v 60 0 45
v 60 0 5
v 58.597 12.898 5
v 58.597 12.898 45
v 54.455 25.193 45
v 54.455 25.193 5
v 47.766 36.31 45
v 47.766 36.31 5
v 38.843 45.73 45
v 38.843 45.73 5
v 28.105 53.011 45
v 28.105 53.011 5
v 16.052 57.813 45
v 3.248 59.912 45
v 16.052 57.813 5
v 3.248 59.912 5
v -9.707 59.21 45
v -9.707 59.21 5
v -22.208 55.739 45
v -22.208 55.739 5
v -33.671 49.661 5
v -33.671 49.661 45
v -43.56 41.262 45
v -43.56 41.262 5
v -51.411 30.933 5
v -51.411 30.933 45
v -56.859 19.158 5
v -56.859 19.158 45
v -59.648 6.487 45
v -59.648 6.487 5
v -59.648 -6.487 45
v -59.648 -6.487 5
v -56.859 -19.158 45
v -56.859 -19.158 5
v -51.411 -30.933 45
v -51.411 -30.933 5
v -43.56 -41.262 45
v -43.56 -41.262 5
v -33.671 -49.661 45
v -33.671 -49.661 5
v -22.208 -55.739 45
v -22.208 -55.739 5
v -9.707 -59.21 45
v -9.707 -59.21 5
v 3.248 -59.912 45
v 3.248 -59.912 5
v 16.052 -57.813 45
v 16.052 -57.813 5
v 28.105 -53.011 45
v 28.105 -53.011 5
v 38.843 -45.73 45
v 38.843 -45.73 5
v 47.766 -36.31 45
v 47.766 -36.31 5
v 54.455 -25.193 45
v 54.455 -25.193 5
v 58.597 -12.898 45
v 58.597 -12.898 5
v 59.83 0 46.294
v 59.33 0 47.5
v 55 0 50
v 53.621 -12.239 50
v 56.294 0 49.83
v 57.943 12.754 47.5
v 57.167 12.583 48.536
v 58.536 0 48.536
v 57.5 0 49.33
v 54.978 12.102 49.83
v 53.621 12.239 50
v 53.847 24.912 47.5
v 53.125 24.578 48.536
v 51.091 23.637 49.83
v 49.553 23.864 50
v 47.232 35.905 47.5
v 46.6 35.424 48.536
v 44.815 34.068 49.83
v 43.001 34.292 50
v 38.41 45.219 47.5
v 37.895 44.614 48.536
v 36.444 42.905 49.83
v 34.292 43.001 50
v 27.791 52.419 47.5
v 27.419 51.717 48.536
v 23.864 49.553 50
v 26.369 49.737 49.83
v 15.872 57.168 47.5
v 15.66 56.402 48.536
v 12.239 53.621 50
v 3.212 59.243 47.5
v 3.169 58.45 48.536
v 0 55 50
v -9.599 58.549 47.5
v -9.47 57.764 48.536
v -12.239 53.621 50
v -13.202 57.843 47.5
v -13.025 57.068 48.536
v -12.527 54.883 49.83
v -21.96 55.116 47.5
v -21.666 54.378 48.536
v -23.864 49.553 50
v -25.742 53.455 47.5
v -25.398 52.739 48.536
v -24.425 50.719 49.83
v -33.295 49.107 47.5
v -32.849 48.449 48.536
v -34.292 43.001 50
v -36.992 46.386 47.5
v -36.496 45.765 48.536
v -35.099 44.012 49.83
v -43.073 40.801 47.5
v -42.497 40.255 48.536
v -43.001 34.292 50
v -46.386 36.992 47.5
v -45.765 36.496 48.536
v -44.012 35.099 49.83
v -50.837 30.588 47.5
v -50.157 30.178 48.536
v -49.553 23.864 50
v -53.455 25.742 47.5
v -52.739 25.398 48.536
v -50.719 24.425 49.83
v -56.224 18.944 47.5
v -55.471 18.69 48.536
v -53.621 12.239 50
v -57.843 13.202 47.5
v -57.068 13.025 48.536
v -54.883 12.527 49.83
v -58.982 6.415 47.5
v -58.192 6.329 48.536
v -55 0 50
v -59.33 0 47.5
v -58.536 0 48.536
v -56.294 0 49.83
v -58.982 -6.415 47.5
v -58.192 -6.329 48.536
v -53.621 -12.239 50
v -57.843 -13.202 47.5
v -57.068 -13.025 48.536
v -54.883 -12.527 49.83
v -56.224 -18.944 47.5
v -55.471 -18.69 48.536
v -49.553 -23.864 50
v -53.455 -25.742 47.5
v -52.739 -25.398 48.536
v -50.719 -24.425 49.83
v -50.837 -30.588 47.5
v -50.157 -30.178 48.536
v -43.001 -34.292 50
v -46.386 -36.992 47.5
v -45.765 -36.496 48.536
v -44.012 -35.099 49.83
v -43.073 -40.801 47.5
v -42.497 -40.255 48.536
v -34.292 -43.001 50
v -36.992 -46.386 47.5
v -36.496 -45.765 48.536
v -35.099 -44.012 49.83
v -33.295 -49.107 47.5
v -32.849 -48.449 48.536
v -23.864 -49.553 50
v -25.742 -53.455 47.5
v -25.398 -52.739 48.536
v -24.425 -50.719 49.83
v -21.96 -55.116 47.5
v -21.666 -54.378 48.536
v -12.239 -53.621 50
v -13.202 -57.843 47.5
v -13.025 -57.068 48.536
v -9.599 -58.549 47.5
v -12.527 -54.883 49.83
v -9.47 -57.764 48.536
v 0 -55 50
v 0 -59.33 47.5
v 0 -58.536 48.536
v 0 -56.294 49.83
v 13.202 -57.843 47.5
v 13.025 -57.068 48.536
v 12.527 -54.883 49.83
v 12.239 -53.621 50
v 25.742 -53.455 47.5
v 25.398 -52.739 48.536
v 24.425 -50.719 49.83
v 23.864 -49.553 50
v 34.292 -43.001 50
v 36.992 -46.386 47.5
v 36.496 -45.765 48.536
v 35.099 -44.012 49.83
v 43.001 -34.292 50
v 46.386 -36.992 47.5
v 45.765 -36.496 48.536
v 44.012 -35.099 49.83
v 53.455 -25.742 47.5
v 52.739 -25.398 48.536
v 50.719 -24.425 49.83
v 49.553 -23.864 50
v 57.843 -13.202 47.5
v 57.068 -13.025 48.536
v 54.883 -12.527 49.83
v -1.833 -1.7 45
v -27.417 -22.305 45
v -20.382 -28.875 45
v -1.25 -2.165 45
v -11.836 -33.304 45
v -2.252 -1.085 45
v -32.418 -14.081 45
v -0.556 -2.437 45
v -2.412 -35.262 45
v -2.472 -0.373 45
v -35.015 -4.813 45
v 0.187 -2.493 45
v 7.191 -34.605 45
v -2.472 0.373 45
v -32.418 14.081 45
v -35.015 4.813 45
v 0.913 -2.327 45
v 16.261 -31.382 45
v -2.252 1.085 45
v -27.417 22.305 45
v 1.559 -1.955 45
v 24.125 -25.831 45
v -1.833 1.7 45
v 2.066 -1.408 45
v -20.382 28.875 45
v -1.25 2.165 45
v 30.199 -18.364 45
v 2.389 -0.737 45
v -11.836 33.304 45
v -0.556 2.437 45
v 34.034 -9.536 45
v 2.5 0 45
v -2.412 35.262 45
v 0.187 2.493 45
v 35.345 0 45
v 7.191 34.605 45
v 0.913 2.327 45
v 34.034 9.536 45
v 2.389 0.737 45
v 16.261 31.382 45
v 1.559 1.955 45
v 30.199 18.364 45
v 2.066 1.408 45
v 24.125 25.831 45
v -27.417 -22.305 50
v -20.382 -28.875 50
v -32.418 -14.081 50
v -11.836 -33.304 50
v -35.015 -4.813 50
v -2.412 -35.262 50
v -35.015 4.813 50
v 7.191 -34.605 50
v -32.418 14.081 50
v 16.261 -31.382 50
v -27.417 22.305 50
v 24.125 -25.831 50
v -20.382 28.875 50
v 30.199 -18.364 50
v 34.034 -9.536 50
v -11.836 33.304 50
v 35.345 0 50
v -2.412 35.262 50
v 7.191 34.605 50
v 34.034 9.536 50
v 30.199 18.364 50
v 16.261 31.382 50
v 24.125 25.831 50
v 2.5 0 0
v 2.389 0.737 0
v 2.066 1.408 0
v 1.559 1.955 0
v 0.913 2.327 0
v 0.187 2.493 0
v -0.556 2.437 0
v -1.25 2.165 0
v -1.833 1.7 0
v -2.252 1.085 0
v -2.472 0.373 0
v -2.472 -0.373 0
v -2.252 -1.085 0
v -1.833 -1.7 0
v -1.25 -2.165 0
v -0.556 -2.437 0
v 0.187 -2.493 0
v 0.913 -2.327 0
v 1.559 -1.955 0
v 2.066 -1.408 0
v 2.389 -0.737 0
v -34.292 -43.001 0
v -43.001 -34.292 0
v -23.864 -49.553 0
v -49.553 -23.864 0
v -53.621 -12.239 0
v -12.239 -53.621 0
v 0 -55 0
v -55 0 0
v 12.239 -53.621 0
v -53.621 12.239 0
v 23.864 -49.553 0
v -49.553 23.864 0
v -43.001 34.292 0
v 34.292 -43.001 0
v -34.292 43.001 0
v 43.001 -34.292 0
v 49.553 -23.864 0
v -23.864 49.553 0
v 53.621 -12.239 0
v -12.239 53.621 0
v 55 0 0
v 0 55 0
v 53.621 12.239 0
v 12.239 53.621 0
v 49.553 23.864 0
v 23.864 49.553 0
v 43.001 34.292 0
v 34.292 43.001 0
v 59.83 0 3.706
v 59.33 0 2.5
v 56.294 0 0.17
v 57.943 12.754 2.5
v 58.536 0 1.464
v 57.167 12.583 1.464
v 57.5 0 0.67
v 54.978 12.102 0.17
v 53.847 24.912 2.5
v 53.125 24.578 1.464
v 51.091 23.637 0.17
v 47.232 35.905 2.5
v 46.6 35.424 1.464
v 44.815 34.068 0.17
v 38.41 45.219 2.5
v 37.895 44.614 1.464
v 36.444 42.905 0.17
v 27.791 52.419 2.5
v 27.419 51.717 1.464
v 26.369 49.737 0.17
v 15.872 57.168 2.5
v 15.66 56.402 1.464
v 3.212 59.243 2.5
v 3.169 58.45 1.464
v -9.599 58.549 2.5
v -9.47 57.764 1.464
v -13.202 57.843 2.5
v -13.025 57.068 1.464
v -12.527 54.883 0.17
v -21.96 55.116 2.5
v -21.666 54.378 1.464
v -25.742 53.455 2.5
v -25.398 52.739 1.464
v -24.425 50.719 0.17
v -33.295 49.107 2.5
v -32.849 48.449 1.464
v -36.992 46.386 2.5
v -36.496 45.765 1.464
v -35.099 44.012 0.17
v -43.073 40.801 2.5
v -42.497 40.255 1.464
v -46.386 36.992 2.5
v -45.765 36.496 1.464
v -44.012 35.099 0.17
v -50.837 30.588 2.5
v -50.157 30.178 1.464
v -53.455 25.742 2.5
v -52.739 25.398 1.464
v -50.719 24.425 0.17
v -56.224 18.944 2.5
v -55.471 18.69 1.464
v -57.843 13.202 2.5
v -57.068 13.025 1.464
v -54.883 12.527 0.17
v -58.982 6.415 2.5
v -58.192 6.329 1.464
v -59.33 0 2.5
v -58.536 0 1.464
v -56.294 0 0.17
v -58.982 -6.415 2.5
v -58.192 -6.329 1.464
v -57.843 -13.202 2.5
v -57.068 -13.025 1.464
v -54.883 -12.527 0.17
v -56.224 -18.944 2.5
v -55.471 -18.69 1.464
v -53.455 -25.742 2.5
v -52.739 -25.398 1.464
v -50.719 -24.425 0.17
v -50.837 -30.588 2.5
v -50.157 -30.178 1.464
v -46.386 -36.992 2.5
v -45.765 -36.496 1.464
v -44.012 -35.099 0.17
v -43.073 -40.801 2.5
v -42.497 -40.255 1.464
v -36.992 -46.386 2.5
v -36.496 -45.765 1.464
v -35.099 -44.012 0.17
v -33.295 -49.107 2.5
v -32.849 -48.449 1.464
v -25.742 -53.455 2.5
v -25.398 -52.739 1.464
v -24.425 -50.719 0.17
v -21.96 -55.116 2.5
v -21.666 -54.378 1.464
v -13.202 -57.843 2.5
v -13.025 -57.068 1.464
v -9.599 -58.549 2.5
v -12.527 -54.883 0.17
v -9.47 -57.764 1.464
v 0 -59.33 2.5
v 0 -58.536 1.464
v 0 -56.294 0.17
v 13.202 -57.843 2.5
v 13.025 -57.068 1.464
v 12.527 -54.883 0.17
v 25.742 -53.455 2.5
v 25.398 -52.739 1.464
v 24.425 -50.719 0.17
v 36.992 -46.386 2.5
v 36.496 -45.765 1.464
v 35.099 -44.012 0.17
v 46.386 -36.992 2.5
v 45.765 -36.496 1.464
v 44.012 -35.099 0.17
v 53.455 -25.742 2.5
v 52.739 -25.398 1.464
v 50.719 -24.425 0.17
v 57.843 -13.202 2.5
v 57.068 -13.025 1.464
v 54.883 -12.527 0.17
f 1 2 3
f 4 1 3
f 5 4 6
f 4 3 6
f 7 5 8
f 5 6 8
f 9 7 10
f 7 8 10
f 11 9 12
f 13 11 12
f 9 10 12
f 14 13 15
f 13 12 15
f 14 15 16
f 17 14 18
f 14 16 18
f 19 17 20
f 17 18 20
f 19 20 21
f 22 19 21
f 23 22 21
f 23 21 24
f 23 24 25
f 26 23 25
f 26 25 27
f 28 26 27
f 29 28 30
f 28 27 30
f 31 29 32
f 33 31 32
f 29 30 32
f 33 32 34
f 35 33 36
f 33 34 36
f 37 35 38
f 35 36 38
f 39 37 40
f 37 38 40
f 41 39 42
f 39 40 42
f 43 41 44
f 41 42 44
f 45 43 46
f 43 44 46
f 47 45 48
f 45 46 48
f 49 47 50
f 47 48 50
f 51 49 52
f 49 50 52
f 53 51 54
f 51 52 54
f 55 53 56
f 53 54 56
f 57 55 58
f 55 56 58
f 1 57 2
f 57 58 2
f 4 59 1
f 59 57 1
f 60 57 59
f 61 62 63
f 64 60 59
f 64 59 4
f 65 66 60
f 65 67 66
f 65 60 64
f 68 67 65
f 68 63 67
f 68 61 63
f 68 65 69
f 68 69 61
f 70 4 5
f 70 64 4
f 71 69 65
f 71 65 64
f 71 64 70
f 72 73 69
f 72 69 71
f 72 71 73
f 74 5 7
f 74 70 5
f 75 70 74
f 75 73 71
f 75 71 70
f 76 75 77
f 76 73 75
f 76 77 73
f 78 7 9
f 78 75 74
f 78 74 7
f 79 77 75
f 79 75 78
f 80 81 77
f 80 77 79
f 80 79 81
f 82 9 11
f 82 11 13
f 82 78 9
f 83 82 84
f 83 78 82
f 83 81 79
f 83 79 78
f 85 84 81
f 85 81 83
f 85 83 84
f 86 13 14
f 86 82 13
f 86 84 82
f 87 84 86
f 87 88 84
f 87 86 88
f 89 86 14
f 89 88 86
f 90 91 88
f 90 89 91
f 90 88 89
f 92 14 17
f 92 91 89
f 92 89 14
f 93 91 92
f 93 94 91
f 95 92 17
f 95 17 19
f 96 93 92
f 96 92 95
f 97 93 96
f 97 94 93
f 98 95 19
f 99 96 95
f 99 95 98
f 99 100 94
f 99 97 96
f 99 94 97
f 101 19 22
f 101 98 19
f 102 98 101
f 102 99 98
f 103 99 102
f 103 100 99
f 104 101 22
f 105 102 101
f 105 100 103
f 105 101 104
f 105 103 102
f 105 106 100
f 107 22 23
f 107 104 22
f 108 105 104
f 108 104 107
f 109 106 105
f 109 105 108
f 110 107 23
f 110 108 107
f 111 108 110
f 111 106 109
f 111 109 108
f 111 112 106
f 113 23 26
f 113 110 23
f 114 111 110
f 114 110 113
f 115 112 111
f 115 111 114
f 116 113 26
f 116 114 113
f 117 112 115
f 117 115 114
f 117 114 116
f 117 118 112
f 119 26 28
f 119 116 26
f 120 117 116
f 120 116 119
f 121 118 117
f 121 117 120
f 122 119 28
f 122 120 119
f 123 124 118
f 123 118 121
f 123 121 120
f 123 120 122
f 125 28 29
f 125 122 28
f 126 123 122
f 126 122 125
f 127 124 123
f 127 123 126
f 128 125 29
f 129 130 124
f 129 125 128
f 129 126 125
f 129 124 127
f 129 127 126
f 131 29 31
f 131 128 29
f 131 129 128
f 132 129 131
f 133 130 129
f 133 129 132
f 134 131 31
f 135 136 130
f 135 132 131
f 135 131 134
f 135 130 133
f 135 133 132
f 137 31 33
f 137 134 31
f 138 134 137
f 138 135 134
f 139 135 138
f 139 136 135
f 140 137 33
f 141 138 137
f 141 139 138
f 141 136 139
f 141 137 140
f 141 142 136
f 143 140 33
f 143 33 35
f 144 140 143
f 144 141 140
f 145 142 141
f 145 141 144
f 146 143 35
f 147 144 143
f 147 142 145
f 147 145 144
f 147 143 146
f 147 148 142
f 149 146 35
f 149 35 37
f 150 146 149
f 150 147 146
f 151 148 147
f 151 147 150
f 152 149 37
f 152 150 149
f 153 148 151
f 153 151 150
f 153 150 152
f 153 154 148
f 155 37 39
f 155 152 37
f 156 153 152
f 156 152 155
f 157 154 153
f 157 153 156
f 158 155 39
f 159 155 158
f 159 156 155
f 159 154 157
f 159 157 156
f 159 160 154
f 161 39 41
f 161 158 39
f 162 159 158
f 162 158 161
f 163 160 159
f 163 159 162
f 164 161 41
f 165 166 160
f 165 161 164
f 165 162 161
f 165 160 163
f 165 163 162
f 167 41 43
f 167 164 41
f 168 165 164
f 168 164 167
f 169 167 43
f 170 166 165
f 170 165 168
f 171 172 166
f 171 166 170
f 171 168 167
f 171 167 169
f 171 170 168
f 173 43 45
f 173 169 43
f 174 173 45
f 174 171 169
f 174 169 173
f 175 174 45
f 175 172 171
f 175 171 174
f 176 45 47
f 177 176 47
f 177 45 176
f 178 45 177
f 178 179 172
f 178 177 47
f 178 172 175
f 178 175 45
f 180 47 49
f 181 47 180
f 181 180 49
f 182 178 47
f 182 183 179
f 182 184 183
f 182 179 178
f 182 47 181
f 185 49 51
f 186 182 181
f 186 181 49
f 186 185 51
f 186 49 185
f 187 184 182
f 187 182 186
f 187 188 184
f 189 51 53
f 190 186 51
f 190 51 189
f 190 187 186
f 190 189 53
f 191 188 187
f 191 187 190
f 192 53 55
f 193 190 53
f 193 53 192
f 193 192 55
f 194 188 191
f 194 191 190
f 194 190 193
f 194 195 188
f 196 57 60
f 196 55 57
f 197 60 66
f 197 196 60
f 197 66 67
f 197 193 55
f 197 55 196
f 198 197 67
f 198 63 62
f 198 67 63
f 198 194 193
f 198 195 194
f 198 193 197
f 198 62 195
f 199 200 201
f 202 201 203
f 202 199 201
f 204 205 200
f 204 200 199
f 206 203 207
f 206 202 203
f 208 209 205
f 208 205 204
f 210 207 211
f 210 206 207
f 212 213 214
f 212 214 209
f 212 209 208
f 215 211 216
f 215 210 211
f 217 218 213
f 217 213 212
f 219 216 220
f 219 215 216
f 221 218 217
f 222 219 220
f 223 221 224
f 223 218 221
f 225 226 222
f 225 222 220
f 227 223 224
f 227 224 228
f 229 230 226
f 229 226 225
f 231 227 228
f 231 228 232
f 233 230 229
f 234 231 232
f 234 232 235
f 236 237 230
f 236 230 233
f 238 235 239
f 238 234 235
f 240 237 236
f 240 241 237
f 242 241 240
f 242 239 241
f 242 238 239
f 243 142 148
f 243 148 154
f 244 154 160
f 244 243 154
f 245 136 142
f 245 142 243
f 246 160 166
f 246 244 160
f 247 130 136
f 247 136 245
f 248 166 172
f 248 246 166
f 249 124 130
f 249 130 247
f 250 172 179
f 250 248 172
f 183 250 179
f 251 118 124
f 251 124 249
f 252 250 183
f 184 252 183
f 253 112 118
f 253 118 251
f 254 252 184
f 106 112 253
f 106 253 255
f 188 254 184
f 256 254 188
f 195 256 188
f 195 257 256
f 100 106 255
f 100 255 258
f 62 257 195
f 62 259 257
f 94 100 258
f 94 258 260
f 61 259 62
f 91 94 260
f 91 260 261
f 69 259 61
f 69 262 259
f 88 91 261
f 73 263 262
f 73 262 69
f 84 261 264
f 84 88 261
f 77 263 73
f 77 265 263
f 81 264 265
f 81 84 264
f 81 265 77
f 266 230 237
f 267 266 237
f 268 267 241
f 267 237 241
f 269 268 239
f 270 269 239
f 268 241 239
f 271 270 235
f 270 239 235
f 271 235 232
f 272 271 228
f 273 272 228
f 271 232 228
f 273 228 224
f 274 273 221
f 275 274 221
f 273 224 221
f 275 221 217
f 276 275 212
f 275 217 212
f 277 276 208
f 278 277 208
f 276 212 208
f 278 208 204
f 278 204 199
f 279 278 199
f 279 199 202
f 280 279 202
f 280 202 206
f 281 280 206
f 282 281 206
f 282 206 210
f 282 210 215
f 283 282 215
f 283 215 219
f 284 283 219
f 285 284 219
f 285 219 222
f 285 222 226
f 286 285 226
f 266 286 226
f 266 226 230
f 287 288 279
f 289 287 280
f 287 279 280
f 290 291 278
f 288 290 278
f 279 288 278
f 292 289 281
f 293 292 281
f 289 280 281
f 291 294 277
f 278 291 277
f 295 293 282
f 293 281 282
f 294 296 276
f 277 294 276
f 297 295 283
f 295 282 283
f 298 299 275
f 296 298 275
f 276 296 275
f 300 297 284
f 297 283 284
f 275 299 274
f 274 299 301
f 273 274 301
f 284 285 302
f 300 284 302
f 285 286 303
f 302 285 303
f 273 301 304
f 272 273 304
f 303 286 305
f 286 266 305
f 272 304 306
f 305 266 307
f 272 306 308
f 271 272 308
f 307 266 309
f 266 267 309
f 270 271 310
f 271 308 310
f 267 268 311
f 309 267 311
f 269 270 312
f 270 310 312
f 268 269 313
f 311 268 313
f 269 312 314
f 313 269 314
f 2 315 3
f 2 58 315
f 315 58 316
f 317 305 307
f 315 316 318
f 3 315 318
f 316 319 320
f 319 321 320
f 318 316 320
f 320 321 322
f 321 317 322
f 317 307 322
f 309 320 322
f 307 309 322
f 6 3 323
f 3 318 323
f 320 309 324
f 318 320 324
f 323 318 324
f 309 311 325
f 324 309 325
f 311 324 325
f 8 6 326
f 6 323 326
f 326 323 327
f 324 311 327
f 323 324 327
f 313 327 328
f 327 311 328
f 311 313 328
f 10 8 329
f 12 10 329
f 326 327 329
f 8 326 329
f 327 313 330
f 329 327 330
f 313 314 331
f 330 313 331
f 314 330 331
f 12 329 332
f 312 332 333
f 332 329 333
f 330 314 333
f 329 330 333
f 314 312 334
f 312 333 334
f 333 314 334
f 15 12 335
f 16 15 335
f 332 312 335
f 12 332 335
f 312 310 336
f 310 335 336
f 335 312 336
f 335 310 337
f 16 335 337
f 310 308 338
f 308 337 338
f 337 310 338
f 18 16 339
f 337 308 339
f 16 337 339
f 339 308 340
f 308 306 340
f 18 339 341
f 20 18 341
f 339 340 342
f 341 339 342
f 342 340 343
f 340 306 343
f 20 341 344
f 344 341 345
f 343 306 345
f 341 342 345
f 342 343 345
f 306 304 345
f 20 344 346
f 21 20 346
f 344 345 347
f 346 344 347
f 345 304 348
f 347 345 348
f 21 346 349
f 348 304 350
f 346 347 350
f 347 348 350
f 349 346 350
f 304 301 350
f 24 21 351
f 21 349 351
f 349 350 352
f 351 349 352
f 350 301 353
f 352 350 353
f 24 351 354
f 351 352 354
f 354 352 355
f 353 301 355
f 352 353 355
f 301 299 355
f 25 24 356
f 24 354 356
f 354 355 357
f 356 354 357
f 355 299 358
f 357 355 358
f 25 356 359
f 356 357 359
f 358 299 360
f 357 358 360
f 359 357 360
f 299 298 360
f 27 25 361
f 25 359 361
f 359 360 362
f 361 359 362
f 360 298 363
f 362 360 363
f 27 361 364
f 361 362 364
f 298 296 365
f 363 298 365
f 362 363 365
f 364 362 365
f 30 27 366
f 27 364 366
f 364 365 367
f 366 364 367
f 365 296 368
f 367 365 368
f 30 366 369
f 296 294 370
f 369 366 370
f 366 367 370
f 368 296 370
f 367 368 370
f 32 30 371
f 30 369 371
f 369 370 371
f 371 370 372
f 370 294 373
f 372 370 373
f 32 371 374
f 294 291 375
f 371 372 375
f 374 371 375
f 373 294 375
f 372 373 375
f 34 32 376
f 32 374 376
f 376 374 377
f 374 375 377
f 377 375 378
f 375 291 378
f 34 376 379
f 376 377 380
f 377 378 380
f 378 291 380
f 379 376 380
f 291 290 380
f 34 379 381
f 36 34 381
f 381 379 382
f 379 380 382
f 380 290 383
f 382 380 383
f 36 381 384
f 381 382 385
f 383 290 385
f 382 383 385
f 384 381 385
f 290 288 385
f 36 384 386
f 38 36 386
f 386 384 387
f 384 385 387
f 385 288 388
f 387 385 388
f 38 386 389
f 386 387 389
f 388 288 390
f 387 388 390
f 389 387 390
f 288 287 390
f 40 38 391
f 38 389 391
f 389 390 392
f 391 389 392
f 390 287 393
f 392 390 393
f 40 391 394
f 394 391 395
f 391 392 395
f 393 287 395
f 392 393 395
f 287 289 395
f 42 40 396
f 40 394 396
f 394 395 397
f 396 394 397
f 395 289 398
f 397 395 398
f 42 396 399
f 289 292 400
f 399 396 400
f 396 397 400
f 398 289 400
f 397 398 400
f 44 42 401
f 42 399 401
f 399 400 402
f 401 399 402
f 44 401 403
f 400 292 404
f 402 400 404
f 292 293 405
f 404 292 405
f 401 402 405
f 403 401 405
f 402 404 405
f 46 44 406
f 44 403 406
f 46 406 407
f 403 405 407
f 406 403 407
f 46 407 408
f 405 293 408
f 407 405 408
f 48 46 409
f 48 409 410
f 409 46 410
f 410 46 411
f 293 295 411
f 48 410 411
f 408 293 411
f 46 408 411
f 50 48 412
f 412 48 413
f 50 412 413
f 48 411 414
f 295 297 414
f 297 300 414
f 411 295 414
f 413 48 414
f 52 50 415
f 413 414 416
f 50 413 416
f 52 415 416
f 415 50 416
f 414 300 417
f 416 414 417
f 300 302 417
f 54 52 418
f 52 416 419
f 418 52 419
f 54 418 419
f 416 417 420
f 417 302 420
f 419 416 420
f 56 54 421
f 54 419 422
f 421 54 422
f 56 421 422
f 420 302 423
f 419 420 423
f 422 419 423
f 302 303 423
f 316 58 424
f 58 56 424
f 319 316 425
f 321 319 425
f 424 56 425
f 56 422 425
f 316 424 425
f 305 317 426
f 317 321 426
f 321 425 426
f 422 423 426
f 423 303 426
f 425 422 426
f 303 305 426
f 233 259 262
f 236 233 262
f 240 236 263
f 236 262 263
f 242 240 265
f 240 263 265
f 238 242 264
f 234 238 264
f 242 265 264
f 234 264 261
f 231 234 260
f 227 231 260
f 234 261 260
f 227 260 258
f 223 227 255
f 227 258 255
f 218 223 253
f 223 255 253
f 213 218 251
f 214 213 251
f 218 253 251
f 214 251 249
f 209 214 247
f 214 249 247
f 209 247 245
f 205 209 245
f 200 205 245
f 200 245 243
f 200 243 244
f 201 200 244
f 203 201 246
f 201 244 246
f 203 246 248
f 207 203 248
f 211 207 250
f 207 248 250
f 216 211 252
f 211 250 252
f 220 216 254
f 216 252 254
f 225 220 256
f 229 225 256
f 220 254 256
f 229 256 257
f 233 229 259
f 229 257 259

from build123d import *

# Parameters (mm, degrees)
SKETCH1_R           = 60
BOSS_EXTRUDE1_DEPTH = 50
FILLET1_R           = 5
SKETCH2_R           = 35.344502653
CUT_EXTRUDE1_DEPTH  = 5
SKETCH3_R           = 2.5
CUT_EXTRUDE2_DEPTH  = 97.046863624


with BuildPart() as part:
    # Sketch1 → Boss-Extrude1 (new body)
    with BuildSketch(Plane.XY):
        Circle(SKETCH1_R)
    extrude(amount=BOSS_EXTRUDE1_DEPTH)

    # Fillet1
    fillet1_edges = [part.edges().sort_by_distance(p)[0] for p in [
        (-60, 0, 0),
        (-60, 0, 50),
    ]]
    fillet(fillet1_edges, radius=FILLET1_R)

    # Sketch2 → Cut-Extrude1 (cut)
    with BuildSketch(Plane.XY.offset(50)):
        Circle(SKETCH2_R)
    extrude(amount=-CUT_EXTRUDE1_DEPTH, mode=Mode.SUBTRACT)

    # Sketch3 → Cut-Extrude2 (cut, through all)
    with BuildSketch(Plane.XY.offset(45)):
        Circle(SKETCH3_R)
    extrude(amount=-CUT_EXTRUDE2_DEPTH, mode=Mode.SUBTRACT)


solid = part.part
